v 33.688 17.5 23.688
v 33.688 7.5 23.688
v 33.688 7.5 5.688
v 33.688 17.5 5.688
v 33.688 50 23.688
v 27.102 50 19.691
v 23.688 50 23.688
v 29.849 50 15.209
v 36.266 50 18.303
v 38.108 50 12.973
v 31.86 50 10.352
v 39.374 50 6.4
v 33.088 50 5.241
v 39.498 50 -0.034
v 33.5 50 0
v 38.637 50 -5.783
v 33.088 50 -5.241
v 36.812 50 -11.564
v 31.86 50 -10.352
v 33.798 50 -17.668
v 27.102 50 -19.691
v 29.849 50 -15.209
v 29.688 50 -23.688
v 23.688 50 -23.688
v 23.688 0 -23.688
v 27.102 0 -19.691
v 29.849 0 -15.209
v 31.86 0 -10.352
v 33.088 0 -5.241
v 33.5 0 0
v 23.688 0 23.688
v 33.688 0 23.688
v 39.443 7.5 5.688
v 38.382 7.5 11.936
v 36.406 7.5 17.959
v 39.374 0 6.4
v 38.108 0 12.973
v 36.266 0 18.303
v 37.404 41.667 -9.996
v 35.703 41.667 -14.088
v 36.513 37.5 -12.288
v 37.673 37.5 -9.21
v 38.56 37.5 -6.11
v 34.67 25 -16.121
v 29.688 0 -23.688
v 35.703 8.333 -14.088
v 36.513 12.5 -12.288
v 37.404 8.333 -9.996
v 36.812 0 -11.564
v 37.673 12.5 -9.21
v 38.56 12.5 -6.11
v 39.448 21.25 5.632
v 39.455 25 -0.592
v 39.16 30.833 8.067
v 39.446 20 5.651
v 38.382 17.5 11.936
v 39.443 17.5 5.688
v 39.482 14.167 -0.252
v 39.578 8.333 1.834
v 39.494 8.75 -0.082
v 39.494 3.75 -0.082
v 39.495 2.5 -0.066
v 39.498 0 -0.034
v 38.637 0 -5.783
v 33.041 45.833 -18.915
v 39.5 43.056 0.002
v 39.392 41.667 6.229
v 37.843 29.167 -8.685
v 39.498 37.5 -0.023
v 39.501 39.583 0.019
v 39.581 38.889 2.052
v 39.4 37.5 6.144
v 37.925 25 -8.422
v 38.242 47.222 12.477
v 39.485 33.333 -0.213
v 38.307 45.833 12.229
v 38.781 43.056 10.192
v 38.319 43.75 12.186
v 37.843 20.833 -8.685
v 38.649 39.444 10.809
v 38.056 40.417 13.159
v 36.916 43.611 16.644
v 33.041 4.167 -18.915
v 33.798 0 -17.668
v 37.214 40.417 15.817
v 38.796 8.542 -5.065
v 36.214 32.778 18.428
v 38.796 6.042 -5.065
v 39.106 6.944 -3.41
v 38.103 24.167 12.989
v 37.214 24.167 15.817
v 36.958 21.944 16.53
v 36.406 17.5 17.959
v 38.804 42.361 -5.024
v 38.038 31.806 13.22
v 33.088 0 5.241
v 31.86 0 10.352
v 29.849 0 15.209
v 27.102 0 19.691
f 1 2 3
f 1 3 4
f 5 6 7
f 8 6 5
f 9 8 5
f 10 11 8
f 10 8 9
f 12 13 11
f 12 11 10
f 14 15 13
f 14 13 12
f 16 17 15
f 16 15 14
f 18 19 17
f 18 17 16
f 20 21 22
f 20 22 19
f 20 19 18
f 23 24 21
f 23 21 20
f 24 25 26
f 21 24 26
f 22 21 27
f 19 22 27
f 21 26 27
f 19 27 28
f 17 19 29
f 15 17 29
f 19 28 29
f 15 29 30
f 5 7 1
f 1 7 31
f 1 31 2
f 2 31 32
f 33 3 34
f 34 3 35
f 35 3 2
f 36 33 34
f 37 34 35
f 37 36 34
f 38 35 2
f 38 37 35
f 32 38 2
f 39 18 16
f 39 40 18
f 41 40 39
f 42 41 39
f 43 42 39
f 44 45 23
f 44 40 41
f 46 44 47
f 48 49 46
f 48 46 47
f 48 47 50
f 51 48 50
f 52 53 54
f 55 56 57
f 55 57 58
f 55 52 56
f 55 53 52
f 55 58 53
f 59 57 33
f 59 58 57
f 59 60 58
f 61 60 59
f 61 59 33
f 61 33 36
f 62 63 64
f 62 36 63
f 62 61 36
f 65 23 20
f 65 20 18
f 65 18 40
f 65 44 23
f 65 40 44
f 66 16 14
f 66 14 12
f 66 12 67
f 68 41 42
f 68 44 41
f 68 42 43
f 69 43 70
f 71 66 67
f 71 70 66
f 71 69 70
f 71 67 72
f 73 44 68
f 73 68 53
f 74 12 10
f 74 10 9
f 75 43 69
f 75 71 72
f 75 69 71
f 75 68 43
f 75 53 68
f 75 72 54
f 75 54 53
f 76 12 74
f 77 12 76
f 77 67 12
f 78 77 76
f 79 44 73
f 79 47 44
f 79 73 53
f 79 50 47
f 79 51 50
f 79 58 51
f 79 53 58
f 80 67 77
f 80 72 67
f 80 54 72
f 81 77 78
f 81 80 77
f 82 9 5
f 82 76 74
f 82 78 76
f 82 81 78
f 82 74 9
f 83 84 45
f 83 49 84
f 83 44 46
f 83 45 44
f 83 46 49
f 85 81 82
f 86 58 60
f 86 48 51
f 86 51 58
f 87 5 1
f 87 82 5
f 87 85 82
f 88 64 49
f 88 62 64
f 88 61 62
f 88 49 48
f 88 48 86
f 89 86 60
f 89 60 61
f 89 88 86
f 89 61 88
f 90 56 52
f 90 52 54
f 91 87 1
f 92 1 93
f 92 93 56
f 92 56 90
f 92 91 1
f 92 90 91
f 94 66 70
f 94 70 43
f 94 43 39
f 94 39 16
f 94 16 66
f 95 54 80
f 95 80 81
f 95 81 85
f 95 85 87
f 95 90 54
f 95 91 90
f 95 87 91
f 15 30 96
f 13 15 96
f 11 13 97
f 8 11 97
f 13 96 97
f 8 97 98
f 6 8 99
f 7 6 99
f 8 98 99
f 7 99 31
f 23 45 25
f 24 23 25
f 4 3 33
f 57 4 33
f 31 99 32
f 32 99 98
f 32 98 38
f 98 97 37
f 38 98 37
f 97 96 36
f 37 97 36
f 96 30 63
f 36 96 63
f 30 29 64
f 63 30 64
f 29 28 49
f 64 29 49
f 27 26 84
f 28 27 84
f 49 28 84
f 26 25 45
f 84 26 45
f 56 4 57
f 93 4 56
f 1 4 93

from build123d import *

# Parameters (mm, degrees)
BOSS_EXTRUDE1_DEPTH = 50
SKETCH3_W           = 6
SKETCH3_H           = 10
CUT_EXTRUDE1_DEPTH  = 18


with BuildPart() as part:
    # Sketch2 → Boss-Extrude1 (new body)
    with BuildSketch(Plane(origin=(0, 0, 0), x_dir=(1, 0, 0), z_dir=(0, 1, 0))):
        with BuildLine():
            Line((29.68807717, 23.68807717), (23.68807717, 23.68807717))
            ThreePointArc((23.68807717, 23.68807717), (30.949964339, 12.819894984), (33.5, 0))
            ThreePointArc((33.5, 0), (30.949964339, -12.819894984), (23.68807717, -23.68807717))
            Line((23.68807717, -23.68807717), (33.68807717, -23.68807717))
            add(Edge.make_bspline(
                [(29.68807717, 23.68807717), (47.221735333, 1.183613852), (33.68807717, -23.68807717)],
                knots=[0, 0, 0, 1, 1, 1], degree=2))
        make_face()
    extrude(amount=BOSS_EXTRUDE1_DEPTH)

    # Sketch3 → Cut-Extrude1 (cut)
    with BuildSketch(Plane.XY.offset(23.68807717)):
        with Locations((36.68807717, 12.5)):
            Rectangle(SKETCH3_W, SKETCH3_H)
    extrude(amount=-CUT_EXTRUDE1_DEPTH, mode=Mode.SUBTRACT)


solid = part.part
